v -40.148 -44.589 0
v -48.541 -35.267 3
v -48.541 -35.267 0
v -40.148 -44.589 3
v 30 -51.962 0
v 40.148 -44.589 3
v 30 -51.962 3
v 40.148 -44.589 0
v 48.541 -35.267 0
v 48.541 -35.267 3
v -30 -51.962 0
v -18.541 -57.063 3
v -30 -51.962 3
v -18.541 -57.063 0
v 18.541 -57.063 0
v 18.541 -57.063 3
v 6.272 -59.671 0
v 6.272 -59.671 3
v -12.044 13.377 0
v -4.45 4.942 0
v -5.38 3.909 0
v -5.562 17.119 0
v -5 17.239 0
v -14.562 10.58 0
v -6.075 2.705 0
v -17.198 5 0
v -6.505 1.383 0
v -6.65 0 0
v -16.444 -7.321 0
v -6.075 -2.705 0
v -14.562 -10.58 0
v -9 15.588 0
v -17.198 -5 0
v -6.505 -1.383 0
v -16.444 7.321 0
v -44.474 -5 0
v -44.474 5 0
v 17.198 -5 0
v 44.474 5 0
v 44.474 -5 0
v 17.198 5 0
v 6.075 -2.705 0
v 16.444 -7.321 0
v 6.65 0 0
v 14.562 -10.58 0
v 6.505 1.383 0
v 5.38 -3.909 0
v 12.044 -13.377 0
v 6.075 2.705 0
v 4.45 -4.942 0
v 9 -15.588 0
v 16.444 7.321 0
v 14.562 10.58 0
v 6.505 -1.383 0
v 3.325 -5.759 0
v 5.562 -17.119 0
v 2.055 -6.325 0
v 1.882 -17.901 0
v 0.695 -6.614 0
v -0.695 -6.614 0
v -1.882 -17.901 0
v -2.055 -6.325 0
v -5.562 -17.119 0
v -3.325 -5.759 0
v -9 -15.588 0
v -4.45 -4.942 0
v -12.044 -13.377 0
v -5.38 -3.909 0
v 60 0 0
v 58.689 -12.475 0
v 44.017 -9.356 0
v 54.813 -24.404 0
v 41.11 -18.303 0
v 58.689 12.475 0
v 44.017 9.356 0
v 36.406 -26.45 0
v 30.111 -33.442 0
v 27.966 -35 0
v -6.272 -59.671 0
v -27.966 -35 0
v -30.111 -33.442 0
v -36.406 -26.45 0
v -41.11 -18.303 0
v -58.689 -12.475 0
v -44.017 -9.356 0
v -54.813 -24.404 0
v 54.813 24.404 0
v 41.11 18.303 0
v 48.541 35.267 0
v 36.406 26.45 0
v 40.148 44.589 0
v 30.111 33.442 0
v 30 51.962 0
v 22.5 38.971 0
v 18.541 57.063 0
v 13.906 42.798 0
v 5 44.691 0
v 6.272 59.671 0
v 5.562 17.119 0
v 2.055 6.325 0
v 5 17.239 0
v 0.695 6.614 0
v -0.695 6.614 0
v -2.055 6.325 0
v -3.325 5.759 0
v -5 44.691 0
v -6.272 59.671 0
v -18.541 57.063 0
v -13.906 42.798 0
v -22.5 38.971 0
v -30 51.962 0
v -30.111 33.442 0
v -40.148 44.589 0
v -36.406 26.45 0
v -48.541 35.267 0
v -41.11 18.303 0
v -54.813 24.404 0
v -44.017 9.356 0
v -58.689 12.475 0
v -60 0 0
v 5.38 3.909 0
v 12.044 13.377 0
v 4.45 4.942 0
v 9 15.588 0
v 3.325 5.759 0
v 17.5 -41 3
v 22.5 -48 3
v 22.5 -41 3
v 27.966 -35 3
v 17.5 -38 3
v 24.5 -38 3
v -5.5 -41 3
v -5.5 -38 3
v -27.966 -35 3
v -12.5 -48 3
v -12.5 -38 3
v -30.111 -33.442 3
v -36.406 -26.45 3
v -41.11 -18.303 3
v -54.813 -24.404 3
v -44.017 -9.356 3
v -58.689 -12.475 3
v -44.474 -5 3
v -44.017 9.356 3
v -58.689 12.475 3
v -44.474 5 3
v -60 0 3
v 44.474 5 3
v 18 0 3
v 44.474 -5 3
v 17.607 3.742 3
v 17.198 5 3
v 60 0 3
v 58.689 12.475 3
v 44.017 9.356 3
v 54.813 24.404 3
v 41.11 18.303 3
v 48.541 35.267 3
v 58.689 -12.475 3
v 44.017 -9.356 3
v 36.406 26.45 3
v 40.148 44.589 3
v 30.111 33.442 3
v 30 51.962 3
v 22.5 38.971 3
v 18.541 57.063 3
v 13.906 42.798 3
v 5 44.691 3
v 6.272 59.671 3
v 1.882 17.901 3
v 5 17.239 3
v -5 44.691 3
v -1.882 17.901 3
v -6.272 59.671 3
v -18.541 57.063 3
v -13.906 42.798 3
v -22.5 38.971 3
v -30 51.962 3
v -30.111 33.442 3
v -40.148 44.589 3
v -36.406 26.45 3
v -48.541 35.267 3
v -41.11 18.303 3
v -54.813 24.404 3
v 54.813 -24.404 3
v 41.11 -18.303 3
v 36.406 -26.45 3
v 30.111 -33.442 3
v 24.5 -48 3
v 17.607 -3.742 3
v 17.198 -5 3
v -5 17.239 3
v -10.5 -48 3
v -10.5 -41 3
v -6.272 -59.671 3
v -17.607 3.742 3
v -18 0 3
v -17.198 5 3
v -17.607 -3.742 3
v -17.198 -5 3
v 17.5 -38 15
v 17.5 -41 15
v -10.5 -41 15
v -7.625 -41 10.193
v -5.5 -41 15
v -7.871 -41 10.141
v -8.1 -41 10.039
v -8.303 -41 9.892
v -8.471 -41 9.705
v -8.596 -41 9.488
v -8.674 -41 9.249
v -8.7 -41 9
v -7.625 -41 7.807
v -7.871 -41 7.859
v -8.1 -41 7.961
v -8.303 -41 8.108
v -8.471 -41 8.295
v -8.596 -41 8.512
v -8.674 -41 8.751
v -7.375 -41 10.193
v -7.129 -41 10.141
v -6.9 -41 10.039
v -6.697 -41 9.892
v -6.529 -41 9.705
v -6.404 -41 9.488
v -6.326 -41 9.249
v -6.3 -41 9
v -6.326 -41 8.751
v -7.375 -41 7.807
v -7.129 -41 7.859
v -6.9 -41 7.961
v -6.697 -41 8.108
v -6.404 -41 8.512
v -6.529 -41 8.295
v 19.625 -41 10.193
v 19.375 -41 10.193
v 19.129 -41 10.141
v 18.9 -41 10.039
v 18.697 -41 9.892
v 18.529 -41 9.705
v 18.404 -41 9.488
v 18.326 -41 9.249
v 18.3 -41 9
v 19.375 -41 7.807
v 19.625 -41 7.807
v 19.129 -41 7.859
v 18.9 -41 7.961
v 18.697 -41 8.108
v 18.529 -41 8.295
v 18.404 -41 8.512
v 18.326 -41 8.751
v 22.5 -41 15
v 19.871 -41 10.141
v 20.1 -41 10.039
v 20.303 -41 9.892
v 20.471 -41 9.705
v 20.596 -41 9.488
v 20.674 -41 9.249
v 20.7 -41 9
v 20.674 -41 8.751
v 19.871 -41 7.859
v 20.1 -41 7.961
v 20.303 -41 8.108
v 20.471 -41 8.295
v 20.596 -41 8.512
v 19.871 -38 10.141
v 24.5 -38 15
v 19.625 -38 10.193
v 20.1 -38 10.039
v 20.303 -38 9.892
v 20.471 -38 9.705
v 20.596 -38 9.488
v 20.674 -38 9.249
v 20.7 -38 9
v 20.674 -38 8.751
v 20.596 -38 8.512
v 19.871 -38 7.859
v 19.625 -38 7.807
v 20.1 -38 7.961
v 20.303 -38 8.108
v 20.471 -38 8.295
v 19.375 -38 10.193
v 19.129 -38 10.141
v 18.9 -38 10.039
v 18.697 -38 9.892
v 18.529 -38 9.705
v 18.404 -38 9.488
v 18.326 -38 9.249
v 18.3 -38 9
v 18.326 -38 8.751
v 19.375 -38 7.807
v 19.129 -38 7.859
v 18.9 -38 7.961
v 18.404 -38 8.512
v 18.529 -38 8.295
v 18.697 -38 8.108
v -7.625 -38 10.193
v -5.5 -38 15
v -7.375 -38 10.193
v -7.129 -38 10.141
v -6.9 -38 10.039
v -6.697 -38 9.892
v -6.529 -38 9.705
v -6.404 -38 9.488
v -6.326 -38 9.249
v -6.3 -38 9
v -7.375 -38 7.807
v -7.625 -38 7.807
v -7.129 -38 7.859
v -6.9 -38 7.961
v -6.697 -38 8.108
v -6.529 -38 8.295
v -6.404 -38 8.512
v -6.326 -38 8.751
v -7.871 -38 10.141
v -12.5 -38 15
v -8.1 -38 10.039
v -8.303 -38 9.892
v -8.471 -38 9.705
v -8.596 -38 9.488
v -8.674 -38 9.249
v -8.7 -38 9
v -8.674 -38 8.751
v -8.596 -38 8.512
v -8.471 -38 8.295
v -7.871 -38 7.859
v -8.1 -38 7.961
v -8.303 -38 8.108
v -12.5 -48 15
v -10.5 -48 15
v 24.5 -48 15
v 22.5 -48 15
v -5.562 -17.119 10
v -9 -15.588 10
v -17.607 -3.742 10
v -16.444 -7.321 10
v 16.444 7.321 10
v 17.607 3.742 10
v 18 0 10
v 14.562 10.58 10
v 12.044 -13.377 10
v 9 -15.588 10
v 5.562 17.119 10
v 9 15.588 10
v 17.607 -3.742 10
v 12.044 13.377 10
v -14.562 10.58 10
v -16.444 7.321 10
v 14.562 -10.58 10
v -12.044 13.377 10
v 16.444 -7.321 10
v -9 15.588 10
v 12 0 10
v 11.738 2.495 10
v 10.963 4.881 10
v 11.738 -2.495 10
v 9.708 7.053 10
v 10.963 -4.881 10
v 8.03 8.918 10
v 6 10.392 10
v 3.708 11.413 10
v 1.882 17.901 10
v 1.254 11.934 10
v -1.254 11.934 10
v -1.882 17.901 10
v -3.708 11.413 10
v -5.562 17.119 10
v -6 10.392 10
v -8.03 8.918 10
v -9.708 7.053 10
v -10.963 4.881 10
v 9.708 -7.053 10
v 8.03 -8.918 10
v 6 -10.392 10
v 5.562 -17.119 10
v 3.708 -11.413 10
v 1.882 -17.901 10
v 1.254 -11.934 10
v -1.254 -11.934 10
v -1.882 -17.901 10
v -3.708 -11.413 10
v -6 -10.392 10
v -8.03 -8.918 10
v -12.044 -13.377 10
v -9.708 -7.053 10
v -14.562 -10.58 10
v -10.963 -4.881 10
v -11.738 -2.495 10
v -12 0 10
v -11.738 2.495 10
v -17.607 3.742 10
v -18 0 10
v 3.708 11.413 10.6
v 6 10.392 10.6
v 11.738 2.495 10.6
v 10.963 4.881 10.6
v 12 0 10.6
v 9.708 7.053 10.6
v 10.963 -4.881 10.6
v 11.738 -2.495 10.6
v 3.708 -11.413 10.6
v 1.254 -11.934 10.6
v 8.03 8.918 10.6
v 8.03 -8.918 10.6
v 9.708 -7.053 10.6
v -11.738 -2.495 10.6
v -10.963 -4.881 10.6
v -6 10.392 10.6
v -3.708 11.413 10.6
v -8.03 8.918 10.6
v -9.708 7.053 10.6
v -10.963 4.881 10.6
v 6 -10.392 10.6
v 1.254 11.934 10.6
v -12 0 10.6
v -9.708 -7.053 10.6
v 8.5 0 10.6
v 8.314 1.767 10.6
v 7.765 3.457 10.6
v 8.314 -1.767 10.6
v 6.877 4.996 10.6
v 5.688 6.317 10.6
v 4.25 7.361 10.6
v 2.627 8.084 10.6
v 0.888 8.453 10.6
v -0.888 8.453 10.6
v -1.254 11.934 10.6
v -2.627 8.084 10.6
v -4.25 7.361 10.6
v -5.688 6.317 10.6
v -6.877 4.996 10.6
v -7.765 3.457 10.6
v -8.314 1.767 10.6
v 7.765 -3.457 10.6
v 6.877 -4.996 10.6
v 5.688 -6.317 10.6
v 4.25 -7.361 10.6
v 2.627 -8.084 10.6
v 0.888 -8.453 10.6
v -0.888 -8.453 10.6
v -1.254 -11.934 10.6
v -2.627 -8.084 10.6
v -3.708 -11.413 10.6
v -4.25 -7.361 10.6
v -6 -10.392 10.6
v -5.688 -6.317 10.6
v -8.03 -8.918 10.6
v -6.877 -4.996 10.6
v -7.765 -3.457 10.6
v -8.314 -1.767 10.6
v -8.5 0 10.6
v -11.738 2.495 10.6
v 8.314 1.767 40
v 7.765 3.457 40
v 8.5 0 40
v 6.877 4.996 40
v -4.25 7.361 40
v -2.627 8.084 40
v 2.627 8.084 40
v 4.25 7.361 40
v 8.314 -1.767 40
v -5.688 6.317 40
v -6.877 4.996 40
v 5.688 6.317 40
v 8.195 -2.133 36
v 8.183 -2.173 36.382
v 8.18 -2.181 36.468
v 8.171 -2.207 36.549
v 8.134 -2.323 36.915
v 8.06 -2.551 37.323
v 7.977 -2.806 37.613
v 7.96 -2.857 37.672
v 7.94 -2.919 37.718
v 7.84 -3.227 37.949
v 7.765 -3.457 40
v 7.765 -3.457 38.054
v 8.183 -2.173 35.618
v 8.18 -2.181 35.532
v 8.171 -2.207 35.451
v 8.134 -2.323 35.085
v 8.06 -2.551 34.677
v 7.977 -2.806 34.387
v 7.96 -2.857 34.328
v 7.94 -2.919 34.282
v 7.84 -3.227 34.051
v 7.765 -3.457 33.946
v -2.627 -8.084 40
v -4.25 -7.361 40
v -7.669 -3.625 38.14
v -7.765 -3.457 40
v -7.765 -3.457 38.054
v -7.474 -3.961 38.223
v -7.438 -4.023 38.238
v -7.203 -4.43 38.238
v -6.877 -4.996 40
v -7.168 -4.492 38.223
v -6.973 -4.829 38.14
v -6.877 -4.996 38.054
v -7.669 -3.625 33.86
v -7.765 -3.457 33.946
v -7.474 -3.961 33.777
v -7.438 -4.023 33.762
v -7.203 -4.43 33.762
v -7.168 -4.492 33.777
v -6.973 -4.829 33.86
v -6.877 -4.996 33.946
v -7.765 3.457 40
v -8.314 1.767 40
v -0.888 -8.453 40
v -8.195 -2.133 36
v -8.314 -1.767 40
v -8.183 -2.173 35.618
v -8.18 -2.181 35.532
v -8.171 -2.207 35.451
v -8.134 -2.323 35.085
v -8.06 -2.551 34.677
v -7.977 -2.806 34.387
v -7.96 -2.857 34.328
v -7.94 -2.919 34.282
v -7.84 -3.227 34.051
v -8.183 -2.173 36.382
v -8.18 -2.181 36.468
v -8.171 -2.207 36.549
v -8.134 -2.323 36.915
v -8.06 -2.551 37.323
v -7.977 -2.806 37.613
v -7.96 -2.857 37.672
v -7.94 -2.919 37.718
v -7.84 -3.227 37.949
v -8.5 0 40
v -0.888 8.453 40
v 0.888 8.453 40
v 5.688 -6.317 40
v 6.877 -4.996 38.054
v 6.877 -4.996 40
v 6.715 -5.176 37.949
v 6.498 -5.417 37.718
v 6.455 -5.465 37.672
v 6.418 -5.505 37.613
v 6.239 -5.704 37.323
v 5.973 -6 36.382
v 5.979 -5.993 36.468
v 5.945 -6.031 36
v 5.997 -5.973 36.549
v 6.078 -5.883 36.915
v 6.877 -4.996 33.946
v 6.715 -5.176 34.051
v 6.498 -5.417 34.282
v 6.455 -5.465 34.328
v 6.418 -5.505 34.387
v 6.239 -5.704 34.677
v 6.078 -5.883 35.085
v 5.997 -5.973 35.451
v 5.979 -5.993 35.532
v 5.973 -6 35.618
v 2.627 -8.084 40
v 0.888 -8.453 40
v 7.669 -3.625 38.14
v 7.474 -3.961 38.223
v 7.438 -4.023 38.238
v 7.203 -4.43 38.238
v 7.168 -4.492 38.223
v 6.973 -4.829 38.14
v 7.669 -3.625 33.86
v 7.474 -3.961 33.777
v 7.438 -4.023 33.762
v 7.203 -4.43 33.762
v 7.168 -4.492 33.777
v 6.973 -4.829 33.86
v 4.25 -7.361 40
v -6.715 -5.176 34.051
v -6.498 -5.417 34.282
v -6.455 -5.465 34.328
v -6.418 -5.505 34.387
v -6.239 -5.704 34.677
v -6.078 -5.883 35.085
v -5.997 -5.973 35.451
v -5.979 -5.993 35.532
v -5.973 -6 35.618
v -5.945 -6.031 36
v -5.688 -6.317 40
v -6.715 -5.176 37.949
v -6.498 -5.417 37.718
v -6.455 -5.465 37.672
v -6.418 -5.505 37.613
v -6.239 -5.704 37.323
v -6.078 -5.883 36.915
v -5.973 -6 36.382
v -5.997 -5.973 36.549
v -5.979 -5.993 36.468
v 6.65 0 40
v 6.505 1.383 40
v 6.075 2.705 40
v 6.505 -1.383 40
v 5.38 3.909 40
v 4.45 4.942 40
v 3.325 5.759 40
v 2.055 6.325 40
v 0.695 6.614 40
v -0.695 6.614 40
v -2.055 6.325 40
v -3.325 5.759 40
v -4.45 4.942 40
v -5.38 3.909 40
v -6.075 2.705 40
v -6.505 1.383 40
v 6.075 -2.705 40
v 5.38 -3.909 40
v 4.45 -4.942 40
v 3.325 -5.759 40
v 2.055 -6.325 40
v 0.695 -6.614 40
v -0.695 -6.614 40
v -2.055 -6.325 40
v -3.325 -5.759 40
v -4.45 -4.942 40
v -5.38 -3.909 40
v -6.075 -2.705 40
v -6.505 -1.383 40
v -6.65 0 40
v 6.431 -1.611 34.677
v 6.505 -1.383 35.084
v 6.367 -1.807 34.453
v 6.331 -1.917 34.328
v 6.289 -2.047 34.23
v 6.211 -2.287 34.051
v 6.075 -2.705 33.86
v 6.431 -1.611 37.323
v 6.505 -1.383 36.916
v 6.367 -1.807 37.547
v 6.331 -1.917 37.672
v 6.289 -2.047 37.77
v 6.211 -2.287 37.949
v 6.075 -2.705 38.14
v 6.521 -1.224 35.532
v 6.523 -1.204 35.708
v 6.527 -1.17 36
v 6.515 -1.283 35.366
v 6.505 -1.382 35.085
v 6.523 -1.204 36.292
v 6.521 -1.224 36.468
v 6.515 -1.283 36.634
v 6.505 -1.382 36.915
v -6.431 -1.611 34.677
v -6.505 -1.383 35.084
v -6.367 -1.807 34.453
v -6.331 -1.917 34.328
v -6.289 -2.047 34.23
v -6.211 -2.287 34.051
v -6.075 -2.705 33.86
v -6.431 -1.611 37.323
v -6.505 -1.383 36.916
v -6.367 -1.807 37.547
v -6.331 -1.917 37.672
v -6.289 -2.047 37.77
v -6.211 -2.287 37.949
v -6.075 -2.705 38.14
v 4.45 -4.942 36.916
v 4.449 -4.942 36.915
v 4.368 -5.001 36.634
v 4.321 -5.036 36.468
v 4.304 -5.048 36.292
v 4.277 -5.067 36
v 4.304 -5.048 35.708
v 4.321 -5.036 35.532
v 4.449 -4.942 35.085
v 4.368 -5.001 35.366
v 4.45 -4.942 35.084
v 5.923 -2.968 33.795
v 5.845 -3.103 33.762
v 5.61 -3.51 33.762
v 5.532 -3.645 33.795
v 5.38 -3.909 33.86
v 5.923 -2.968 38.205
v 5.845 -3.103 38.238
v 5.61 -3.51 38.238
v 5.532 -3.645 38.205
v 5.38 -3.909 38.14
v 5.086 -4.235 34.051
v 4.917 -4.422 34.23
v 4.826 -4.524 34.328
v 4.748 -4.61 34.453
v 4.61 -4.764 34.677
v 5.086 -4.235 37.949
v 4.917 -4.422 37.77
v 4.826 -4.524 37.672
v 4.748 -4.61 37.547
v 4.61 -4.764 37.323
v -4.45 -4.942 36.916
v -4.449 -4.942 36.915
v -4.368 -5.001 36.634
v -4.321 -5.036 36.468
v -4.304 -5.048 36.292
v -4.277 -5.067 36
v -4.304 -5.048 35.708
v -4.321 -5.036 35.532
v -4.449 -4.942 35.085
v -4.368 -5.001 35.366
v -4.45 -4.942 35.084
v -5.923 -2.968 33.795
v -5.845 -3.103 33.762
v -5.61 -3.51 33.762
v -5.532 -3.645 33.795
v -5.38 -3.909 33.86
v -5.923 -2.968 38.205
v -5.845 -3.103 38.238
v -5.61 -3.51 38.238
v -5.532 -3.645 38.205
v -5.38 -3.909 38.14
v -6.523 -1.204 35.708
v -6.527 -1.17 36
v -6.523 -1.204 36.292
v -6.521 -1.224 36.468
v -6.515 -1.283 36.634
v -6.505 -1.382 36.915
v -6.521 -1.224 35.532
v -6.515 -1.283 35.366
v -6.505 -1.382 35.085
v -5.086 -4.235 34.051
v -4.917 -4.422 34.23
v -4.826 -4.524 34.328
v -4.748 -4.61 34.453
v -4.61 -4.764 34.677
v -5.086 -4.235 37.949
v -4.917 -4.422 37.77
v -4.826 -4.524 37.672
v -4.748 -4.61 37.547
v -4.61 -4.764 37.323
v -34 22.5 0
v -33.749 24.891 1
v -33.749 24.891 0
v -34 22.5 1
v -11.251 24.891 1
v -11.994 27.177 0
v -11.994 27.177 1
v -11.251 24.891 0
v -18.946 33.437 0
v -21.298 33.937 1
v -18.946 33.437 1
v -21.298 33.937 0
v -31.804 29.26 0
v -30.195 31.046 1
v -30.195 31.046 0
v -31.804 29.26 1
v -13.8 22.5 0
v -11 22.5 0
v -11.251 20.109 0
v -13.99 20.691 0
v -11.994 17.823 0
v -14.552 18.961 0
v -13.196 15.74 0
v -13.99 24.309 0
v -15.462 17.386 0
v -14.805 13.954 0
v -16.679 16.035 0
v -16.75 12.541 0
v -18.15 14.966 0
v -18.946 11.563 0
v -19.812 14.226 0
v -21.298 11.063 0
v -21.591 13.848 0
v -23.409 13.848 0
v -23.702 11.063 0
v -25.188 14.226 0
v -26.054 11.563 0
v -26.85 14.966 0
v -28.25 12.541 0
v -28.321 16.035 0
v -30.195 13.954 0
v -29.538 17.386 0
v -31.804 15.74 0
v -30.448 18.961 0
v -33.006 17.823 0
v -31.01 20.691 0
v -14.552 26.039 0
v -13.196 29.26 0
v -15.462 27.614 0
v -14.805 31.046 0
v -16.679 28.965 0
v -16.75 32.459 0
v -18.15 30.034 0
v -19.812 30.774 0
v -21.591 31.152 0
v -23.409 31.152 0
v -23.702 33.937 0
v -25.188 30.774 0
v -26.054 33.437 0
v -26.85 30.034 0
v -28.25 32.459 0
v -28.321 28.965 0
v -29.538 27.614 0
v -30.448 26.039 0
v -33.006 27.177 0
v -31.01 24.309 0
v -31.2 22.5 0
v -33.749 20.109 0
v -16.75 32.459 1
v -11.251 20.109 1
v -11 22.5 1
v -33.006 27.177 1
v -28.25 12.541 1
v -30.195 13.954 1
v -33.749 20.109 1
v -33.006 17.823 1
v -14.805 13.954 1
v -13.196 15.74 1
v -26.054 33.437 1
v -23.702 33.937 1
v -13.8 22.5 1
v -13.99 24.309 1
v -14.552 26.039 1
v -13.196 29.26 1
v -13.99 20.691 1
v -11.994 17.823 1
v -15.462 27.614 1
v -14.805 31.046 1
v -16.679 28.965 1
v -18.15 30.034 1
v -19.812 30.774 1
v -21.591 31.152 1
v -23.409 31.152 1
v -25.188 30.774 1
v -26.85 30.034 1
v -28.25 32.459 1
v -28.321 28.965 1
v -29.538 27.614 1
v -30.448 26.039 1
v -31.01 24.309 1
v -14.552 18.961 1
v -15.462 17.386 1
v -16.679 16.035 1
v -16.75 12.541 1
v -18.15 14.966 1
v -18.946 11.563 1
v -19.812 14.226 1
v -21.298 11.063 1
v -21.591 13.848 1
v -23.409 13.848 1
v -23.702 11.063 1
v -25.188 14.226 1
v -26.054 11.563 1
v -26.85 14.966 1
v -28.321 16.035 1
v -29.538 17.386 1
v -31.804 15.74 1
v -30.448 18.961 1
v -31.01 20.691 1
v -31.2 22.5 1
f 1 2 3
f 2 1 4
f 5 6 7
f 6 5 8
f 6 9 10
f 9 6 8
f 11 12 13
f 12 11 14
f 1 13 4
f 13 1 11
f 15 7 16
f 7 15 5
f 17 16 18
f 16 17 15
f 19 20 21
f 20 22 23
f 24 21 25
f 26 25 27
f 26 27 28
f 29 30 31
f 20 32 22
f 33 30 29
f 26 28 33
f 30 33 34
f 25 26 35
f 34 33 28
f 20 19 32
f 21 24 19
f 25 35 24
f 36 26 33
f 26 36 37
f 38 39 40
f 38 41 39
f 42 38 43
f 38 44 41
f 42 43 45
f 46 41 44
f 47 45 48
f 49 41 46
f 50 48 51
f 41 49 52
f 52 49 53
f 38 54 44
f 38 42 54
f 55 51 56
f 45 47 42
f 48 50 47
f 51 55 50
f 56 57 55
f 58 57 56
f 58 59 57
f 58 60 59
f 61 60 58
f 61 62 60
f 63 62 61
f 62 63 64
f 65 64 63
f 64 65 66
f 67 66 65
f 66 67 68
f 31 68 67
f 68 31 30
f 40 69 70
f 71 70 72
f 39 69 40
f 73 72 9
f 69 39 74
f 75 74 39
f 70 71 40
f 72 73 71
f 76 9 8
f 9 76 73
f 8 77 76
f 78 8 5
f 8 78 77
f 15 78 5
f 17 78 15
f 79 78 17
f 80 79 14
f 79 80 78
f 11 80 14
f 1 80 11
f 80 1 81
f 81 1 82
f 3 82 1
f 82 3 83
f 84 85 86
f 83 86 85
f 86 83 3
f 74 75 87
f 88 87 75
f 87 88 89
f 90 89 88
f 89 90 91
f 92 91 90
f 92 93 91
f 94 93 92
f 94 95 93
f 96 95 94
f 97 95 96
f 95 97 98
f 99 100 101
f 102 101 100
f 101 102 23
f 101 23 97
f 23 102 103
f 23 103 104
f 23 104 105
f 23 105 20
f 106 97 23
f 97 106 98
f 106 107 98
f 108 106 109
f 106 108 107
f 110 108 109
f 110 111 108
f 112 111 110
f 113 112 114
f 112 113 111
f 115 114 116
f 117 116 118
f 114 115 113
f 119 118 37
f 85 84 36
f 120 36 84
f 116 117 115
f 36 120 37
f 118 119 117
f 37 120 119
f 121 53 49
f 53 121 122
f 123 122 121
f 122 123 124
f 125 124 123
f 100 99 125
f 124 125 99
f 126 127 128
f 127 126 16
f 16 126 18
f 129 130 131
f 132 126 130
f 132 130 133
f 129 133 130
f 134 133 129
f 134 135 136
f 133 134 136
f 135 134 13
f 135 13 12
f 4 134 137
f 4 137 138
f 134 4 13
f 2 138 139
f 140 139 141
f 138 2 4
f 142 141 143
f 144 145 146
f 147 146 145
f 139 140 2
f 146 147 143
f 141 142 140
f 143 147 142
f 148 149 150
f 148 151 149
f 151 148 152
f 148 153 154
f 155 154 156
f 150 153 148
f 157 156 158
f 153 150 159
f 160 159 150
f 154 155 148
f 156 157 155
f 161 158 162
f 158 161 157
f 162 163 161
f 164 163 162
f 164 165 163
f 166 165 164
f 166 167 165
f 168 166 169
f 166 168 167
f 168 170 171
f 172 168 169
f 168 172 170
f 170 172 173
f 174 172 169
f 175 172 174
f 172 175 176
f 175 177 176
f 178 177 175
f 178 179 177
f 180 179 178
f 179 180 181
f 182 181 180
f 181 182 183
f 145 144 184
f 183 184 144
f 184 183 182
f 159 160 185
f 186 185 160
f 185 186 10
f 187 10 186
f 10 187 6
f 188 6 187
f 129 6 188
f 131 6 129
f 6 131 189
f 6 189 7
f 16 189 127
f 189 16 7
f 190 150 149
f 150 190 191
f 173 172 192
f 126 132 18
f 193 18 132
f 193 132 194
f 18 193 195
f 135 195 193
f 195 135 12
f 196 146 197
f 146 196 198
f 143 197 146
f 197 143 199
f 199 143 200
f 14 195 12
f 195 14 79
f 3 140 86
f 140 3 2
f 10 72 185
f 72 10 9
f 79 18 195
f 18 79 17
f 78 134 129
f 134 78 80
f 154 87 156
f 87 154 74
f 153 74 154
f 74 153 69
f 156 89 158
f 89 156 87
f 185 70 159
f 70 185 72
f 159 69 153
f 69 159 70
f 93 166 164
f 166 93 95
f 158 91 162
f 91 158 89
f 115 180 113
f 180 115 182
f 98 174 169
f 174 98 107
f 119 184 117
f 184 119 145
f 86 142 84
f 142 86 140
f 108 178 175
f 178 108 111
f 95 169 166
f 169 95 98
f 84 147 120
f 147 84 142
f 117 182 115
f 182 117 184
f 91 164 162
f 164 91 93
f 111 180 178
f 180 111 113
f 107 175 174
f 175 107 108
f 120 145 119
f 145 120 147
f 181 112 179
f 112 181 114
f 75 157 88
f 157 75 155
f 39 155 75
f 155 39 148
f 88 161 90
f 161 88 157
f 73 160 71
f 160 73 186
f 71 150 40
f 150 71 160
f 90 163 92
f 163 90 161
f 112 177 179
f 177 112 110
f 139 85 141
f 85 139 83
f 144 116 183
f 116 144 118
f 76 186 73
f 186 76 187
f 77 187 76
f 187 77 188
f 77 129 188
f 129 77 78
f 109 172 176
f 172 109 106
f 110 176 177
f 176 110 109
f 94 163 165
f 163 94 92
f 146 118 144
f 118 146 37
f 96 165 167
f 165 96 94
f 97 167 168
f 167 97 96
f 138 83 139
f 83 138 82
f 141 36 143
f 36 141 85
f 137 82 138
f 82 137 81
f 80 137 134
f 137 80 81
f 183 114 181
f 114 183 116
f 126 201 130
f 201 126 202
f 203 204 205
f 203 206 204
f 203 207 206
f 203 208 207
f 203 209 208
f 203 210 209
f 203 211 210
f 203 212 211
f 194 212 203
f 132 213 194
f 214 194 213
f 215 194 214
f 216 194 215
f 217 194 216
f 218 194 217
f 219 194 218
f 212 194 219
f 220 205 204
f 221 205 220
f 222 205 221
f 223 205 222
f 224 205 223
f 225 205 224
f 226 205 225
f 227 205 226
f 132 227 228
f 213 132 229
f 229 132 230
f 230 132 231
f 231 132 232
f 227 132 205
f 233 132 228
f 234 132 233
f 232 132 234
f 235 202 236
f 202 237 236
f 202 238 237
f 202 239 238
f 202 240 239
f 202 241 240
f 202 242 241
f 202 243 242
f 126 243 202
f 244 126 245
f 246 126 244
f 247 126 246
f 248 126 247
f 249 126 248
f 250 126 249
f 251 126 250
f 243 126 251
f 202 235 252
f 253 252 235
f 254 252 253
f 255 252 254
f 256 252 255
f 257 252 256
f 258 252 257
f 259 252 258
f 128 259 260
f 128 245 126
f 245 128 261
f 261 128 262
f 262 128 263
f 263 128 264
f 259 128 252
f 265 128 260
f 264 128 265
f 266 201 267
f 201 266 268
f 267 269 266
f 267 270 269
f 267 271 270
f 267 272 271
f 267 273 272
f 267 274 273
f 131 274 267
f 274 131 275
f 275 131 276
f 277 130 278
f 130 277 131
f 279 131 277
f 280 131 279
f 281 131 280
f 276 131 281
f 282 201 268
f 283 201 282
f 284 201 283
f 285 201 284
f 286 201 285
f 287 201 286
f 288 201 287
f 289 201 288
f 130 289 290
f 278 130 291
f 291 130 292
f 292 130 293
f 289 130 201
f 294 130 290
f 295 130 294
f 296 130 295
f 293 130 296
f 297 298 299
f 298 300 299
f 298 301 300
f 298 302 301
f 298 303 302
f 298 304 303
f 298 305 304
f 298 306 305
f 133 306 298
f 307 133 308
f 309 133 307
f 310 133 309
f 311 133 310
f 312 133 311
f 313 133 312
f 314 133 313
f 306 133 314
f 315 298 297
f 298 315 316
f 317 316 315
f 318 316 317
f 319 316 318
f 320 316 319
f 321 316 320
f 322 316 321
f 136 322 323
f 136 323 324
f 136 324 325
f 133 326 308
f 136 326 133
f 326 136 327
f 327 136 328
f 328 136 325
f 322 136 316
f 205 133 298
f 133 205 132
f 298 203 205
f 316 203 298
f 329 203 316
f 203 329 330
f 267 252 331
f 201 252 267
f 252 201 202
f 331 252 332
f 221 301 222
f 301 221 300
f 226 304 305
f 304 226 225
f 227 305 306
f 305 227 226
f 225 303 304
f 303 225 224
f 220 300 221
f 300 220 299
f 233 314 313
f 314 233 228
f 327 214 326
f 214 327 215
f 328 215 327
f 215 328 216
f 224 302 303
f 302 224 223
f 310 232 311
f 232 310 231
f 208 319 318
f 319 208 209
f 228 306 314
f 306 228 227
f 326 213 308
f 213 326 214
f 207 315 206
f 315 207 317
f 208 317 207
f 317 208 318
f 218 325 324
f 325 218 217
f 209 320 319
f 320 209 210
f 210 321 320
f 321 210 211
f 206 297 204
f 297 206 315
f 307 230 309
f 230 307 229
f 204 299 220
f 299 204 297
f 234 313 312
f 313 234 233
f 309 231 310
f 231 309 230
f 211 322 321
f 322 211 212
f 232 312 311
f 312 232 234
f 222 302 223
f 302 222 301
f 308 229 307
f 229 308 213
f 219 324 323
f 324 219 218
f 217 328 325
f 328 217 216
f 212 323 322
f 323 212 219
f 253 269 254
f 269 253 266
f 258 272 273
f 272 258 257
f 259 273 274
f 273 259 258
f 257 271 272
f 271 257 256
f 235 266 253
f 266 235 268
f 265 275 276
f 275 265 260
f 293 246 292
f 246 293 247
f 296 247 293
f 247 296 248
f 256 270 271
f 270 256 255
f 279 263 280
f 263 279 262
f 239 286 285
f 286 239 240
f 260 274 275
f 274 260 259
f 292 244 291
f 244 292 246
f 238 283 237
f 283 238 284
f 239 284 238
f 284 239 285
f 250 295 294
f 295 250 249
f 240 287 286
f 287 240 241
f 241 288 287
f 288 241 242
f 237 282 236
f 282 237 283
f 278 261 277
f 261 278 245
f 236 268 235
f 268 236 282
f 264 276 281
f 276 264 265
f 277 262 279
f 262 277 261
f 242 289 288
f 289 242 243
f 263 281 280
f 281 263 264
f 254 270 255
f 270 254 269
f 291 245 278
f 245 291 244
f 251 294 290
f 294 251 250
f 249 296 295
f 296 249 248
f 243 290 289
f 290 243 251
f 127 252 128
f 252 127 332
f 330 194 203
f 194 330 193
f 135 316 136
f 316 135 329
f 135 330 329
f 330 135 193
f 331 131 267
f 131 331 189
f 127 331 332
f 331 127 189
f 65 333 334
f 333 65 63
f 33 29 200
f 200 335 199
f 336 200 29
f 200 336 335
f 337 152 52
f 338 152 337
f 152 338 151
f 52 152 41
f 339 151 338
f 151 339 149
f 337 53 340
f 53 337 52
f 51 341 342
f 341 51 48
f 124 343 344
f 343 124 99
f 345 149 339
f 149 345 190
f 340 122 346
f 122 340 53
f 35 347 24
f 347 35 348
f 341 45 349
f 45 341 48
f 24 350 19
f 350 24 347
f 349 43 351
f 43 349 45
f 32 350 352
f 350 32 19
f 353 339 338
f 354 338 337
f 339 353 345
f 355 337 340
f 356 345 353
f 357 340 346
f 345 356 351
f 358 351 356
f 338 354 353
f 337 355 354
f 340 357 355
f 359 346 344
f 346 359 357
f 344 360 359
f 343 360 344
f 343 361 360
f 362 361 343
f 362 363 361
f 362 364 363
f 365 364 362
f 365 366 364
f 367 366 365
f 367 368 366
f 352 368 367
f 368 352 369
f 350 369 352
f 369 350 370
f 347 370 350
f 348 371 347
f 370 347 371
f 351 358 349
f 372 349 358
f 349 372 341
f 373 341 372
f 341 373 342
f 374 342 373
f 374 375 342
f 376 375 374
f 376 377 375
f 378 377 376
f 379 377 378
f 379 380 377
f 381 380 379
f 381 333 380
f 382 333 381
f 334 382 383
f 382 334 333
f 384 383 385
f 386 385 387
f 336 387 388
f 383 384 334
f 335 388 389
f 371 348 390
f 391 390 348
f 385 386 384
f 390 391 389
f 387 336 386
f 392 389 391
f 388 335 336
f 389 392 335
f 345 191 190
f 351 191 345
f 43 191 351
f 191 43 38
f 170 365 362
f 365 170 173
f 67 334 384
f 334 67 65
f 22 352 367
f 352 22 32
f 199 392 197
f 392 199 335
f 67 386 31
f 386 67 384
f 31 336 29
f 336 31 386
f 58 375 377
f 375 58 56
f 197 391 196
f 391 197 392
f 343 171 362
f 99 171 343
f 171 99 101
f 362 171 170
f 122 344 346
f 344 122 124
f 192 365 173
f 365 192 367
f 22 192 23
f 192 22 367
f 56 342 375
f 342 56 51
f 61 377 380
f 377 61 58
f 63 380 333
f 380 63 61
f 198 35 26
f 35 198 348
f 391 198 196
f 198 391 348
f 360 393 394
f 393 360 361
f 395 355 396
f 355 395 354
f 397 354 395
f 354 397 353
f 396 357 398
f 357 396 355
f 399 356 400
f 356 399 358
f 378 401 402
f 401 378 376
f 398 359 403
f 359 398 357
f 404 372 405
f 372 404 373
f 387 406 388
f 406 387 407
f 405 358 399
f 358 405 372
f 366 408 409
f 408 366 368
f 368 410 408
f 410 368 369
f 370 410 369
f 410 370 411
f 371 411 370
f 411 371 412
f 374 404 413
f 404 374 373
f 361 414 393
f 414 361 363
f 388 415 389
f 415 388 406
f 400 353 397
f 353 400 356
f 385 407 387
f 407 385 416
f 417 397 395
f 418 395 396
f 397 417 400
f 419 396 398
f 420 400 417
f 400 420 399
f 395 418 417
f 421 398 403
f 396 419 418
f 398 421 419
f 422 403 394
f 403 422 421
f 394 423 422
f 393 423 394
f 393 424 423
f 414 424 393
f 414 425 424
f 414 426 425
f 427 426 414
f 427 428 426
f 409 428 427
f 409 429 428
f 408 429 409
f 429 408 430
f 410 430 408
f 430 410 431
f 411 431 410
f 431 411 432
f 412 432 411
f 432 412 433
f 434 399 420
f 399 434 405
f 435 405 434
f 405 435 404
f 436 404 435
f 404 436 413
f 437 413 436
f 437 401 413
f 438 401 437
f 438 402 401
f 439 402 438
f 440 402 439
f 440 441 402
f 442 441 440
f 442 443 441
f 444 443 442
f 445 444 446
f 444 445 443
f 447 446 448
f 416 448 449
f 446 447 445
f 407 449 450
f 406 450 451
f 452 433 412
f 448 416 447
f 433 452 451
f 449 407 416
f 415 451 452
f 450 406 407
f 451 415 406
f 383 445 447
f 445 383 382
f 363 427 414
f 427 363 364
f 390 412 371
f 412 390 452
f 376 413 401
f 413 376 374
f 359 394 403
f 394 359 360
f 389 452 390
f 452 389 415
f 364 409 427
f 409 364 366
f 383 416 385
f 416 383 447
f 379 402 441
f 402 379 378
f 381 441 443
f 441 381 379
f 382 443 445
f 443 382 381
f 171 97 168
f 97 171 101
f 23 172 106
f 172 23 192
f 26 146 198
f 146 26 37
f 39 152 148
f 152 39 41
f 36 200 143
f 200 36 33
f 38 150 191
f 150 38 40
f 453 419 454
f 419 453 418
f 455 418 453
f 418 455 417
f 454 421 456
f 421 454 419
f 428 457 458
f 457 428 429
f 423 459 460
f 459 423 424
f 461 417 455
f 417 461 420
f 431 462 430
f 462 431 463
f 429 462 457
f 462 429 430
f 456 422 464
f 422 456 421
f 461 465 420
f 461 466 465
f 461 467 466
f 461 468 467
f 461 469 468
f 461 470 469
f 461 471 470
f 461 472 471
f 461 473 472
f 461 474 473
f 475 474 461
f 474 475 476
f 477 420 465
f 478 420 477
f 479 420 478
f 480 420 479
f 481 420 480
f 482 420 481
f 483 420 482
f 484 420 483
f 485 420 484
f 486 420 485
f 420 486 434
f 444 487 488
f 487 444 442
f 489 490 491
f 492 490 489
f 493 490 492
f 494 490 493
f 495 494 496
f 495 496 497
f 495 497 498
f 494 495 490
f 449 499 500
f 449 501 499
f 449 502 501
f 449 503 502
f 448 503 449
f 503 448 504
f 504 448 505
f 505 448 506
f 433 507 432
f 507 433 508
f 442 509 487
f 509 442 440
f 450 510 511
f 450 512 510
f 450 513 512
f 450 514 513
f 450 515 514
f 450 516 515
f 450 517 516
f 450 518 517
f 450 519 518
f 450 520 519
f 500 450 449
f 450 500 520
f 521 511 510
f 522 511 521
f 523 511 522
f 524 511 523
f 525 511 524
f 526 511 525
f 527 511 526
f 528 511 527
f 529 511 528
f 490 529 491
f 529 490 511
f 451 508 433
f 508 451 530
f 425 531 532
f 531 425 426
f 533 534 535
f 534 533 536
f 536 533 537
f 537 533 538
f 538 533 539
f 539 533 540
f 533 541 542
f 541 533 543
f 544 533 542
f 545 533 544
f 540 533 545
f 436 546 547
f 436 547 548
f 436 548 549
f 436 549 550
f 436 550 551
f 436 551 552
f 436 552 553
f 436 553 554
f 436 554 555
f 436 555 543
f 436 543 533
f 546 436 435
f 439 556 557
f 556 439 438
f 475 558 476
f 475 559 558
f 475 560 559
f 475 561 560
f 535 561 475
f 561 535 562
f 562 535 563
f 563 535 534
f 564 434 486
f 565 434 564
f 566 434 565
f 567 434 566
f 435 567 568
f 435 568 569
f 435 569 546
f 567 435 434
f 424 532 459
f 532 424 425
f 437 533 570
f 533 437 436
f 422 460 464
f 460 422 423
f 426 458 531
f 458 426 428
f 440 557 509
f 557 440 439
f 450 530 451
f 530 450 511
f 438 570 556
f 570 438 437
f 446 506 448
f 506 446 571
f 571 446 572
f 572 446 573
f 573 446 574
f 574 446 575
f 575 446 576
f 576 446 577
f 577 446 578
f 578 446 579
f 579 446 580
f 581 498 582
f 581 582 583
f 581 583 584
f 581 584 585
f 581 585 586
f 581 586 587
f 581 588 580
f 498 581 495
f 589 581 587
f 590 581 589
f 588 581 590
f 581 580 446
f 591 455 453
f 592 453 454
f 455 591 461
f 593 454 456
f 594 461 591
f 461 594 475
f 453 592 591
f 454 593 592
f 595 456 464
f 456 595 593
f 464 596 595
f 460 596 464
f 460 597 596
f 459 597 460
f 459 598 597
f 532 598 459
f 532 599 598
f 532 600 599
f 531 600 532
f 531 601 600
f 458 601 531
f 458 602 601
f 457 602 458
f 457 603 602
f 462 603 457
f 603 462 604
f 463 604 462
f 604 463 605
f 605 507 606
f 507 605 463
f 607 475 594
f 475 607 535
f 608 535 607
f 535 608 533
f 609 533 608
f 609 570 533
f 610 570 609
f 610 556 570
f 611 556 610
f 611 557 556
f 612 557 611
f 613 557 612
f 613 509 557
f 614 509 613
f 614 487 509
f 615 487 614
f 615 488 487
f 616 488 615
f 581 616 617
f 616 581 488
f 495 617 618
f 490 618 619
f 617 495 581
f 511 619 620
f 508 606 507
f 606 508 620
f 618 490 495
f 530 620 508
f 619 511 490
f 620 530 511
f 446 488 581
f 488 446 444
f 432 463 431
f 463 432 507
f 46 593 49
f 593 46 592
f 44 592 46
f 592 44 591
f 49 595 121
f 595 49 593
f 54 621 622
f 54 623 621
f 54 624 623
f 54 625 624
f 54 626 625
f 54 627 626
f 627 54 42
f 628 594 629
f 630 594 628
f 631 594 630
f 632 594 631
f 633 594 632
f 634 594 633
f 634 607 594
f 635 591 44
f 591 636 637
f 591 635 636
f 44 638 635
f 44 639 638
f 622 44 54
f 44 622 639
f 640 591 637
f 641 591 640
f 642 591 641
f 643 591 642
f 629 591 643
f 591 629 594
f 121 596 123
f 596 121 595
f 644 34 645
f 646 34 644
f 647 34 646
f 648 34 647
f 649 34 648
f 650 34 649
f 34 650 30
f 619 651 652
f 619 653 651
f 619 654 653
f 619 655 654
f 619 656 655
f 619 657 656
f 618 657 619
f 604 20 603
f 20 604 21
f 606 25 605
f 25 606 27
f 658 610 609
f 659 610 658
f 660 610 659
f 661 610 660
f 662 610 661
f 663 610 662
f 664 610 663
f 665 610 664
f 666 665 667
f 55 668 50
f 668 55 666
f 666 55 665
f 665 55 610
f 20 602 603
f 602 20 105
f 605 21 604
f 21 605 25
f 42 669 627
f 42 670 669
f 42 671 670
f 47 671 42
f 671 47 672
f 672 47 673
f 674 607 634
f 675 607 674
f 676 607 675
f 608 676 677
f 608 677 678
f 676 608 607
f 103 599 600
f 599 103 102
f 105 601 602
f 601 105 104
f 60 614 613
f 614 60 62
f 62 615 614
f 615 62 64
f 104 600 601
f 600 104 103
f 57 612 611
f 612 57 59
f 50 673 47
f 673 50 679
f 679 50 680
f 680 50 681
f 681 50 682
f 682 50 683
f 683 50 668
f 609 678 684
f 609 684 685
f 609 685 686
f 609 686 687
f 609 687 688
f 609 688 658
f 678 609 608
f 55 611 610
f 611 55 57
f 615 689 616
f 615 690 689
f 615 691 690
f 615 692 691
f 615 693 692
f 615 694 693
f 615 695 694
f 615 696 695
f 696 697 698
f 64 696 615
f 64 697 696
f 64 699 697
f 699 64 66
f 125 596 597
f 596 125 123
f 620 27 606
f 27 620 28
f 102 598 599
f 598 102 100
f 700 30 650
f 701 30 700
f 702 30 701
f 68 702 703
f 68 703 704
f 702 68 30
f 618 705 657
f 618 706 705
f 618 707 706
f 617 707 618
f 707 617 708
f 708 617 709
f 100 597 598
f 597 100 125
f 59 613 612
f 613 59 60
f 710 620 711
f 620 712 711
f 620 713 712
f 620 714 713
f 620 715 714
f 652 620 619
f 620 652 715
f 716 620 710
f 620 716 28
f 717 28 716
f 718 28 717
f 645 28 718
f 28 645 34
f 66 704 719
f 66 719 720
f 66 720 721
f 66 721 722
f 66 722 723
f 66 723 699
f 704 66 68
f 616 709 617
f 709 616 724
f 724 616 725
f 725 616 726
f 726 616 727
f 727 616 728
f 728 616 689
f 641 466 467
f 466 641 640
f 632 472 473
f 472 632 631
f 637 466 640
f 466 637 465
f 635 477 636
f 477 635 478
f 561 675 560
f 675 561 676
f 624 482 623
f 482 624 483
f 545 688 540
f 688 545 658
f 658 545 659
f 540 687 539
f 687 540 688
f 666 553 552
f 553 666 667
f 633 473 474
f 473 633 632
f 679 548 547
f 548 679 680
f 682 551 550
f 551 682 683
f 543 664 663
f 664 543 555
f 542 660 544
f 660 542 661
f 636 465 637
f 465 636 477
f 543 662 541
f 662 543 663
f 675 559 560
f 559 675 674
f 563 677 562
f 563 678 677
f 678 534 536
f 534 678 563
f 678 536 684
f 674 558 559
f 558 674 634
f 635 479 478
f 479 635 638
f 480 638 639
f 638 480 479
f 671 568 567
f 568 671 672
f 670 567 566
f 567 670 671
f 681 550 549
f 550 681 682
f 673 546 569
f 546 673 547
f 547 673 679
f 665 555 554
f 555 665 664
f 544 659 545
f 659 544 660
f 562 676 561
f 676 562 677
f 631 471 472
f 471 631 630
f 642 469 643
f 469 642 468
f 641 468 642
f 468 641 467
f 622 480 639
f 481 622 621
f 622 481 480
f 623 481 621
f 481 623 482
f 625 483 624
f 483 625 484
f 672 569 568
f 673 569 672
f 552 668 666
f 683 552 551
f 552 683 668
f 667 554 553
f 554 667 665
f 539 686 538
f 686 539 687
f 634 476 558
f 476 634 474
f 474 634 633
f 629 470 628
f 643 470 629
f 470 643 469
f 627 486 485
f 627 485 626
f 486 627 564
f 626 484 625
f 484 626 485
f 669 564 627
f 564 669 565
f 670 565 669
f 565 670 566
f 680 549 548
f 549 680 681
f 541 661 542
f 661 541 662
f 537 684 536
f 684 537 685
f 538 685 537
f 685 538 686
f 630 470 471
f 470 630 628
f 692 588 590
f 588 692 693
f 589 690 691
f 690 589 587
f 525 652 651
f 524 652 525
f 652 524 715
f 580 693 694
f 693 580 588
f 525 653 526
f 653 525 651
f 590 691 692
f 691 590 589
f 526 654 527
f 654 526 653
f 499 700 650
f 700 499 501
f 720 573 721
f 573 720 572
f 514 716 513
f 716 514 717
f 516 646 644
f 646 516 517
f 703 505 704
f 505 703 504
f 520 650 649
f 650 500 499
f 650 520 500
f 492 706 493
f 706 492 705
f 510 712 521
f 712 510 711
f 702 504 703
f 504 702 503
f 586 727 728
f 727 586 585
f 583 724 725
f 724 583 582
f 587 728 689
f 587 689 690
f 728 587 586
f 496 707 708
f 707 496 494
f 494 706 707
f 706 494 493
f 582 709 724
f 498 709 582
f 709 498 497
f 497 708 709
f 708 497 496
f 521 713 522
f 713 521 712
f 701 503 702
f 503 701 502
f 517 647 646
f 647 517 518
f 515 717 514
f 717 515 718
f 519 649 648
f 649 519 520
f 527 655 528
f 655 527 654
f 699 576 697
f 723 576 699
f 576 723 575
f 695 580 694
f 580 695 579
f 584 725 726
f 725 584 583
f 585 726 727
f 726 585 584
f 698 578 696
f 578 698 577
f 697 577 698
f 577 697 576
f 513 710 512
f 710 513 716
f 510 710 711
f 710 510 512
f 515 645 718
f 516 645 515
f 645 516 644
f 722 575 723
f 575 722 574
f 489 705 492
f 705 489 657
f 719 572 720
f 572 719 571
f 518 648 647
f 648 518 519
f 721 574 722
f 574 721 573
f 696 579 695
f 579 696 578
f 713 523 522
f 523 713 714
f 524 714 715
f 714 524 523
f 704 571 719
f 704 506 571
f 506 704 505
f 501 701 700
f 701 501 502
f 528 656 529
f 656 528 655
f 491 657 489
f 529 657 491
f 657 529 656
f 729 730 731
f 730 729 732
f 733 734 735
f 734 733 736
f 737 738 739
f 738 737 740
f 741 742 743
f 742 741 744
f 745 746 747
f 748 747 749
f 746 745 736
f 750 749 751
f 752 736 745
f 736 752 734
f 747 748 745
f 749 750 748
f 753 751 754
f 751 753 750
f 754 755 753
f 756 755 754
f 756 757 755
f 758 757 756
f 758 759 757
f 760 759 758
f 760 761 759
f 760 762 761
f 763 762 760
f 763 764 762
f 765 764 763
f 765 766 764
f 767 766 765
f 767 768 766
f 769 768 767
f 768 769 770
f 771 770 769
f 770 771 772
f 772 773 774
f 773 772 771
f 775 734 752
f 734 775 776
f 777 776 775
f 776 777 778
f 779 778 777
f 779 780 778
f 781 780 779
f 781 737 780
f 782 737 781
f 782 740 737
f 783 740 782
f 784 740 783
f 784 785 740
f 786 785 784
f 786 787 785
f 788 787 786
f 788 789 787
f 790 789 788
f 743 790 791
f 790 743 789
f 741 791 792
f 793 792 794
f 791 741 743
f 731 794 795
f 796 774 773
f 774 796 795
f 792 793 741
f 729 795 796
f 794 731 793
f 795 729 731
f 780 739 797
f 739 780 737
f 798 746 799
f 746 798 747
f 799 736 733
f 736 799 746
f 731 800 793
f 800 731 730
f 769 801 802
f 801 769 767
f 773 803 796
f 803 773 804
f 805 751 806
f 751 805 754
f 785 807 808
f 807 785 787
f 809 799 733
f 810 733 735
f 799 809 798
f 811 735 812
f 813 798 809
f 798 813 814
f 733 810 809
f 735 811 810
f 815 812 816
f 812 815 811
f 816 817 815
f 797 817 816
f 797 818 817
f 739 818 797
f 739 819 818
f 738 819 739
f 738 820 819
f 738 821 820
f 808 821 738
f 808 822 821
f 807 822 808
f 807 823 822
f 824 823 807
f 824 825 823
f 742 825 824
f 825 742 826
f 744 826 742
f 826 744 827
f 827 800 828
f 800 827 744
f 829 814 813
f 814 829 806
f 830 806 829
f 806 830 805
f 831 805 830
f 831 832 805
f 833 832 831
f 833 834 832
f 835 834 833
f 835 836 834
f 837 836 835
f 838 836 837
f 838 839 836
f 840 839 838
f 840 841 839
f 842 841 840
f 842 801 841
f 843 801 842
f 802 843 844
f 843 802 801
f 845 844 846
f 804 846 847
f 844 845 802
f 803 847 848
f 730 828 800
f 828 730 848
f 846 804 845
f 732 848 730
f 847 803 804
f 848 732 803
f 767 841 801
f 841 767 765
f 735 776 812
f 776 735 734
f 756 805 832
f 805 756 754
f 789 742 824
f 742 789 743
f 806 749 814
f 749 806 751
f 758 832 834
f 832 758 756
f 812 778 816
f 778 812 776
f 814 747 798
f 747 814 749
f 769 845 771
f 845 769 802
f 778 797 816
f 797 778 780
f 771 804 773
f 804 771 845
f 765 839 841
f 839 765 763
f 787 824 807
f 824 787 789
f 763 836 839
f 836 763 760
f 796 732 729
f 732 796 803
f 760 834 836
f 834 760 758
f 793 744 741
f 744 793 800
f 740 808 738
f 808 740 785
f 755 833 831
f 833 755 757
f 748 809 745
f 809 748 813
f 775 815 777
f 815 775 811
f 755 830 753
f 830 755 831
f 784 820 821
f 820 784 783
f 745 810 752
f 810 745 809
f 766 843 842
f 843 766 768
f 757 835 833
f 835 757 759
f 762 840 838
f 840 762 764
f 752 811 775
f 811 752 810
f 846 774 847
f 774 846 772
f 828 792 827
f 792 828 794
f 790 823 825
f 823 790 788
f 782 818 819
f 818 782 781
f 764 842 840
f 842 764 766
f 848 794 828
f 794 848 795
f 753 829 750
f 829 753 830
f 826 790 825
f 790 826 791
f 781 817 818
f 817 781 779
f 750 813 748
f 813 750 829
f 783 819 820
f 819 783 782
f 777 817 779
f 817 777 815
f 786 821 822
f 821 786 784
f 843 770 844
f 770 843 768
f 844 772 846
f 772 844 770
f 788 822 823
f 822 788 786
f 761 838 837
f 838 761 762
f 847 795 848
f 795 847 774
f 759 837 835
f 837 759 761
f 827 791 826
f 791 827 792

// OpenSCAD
// Basic gondola stabilizer and platform for a polargraph
//
// Created by Walter Anderson on June 3, 2014
// Version 1.0.3 modified on June 19, 2004
$fs=0.01;

module hole(size, depth, x, y, z) {
	translate([x, y, z]) {
		cylinder(r = size, h = depth, center = false);
	}
}

// This module is designed to fit a parallax Toddler mini
module mini_servo_plate() {
	union() {
		translate([8.5, 1.5, 8.5]) {
			rotate(a=90, v=[1,0,0]) {
				difference() {
					cube(size = [51, 17, 3], center = true);
					union() {
						cube(size = [36, 17, 3], center = true);
						hole(1.75, 6, -21.5, -4.25, -3);
						hole(1.75, 6, -21.5, 3.5, -3);
						hole(1.75, 6, 21.5, -4.25, -3);
						hole(1.75, 6, 21.5, 3.5, -3);
					}
				}
			}
		}
		translate([-18.5, -2, 8.5]) {
			cube(size = [3, 10, 17], center = true);
		}
		translate([35.5, -2, 8.5]) {
			cube(size = [3, 10, 17], center = true);
		}
	}
}

module bearing()
{
	difference() {
		cylinder(h=10, r=18);
		cylinder(h=10, r=8.5);
	}
}

module micro_servo_plate()
{
	union() {
		translate([6, -1.5, 6]) {
			rotate(a=[90,0,0]) {
				difference() {
					cube(size=[33,12,3], center=true);
					union() {
						cube(size=[23,12,3], center=true);
						hole(1.2, 6, -13.5, 0, -3);
						hole(1.2, 6, 13.5, 0, -3);
					}
				}
			}
		}
		translate([-11.5, -5, 6]) 
			cube(size = [2, 10, 12], center = true);
		translate([23.5, -5, 6]) 
			cube(size = [2, 10, 12], center = true);
	}
}

difference() {
	union() {
		// These two differences and the cube translate
		// creates the basic stabalizer base ring

		// Creates the portion of the stabalizer base that will
		// where the servo and its mounting bracket are located.
		difference() {
			cylinder(h=3,r=60);
         translate([0,25,1.5])
				cube(size = [120,120,3], center=true);
		}

		// This creates the outer ring for the stabalizer base
		difference() {
	  		cylinder(h=3,r=60);
	  		cylinder(h=3,r=45);
		}

		// This creates a vertical cross beam for the stabalizer base
		translate([0,30.5,1.5])
			cube(size = [10,41,3],center=true);

		// This creates the cross beam for the stabalizer base
	   translate([0,0,1.5])
			cube(size = [92,10,3],center=true);

		// Add a servo mounting bracket
//		translate([0,-38,3])		// This fits an old Parallax Toddler mini servo
//			mini_servo_plate();
		translate([0,-38,3])		// This fits a standard micro servo
			micro_servo_plate();

		// Add a stepped spacer to hold the central brass tube,
		// and provide elevation from the surface for the two
		// bearings that mount the chain supports.
		union() {
			cylinder(h=10,r=18);
			translate([0,0,10])
				cylinder(h=0.6,r=12);
		}
		
		// If not using a central brass tube, this will create a printed plastic
		// equivalent
		cylinder(h=40, r=8.5);
	}
	
	// This creates the central 17mm hole that the brass tube
	// will get inserted into.
	//cylinder(h=25,r=8.5);

	// This creates a central 13mm hole that just holds the pen, no brass tube
	cylinder(h=75, r=6.65);

	// This creates two holes that can be used in the clamp piece (needed only for 
	// gondola that doesn't use the central brass tube
	rotate(a=[0,0,60])
		translate([0,-5,36])
			rotate(a=[90,0,0])
				cylinder(h=10, r=2.25, center = true);
	rotate(a=[0,0,-60])
		translate([0,-5,36])
			rotate(a=[90,0,0])
				cylinder(h=10, r=2.25, center = true);
}

// This is the bearing spacer
translate([-22.5,22.5,0]) difference() {
	cylinder(h=1,r=11.5);
	cylinder(h=1,r=8.7);
}


// The following code was just used to verify the placement and fit of the additional parts
//difference() {
//	union() {
//		translate([0,0,33])
//			cylinder(h=7, r=18);
//		translate([0,0,32])
//			cylinder(h=1, r=12);
//	}
//	// This creates a central 13mm hole that just holds the pen, no brass tube
//	cylinder(h=75, r=8.6);
//	// This creates two holes that can be used in the clamp piece (needed only for 
//	// gondola that doesn't use the central brass tube
//	rotate(a=[0,0,60])
//		translate([0,-10,36.5])
//			rotate(a=[90,0,0])
//				cylinder(h=20, r=1.25, center = true);
//	rotate(a=[0,0,-60])
//		translate([0,-10,36.5])
//			rotate(a=[90,0,0])
//				cylinder(h=20, r=1.25, center = true);
//	// This creates recesses on the inside if you wish to add a nut
//	rotate(a=[0,0,-60])
//		translate([0,-9.75,36.5])
//			rotate(a=[90,0,0])
//				cylinder(h=3, r=2.85, center = true, $fs=6);
//	rotate(a=[0,0,60])
//		translate([0,-9.75,36.5])
//			rotate(a=[90,0,0])
//				cylinder(h=3, r=2.85, center = true, $fs=6);
//}
//
//
//// Show bearings, to ensure everything will fit properly
//translate([0,0,10.7]) bearing();
//// This is the bearing spacer
//translate([0,0,20.8]) difference() {
//	cylinder(h=1,r=11.5);
//	cylinder(h=1,r=8.7);
//}
//translate([0,0,21.9]) bearing();
